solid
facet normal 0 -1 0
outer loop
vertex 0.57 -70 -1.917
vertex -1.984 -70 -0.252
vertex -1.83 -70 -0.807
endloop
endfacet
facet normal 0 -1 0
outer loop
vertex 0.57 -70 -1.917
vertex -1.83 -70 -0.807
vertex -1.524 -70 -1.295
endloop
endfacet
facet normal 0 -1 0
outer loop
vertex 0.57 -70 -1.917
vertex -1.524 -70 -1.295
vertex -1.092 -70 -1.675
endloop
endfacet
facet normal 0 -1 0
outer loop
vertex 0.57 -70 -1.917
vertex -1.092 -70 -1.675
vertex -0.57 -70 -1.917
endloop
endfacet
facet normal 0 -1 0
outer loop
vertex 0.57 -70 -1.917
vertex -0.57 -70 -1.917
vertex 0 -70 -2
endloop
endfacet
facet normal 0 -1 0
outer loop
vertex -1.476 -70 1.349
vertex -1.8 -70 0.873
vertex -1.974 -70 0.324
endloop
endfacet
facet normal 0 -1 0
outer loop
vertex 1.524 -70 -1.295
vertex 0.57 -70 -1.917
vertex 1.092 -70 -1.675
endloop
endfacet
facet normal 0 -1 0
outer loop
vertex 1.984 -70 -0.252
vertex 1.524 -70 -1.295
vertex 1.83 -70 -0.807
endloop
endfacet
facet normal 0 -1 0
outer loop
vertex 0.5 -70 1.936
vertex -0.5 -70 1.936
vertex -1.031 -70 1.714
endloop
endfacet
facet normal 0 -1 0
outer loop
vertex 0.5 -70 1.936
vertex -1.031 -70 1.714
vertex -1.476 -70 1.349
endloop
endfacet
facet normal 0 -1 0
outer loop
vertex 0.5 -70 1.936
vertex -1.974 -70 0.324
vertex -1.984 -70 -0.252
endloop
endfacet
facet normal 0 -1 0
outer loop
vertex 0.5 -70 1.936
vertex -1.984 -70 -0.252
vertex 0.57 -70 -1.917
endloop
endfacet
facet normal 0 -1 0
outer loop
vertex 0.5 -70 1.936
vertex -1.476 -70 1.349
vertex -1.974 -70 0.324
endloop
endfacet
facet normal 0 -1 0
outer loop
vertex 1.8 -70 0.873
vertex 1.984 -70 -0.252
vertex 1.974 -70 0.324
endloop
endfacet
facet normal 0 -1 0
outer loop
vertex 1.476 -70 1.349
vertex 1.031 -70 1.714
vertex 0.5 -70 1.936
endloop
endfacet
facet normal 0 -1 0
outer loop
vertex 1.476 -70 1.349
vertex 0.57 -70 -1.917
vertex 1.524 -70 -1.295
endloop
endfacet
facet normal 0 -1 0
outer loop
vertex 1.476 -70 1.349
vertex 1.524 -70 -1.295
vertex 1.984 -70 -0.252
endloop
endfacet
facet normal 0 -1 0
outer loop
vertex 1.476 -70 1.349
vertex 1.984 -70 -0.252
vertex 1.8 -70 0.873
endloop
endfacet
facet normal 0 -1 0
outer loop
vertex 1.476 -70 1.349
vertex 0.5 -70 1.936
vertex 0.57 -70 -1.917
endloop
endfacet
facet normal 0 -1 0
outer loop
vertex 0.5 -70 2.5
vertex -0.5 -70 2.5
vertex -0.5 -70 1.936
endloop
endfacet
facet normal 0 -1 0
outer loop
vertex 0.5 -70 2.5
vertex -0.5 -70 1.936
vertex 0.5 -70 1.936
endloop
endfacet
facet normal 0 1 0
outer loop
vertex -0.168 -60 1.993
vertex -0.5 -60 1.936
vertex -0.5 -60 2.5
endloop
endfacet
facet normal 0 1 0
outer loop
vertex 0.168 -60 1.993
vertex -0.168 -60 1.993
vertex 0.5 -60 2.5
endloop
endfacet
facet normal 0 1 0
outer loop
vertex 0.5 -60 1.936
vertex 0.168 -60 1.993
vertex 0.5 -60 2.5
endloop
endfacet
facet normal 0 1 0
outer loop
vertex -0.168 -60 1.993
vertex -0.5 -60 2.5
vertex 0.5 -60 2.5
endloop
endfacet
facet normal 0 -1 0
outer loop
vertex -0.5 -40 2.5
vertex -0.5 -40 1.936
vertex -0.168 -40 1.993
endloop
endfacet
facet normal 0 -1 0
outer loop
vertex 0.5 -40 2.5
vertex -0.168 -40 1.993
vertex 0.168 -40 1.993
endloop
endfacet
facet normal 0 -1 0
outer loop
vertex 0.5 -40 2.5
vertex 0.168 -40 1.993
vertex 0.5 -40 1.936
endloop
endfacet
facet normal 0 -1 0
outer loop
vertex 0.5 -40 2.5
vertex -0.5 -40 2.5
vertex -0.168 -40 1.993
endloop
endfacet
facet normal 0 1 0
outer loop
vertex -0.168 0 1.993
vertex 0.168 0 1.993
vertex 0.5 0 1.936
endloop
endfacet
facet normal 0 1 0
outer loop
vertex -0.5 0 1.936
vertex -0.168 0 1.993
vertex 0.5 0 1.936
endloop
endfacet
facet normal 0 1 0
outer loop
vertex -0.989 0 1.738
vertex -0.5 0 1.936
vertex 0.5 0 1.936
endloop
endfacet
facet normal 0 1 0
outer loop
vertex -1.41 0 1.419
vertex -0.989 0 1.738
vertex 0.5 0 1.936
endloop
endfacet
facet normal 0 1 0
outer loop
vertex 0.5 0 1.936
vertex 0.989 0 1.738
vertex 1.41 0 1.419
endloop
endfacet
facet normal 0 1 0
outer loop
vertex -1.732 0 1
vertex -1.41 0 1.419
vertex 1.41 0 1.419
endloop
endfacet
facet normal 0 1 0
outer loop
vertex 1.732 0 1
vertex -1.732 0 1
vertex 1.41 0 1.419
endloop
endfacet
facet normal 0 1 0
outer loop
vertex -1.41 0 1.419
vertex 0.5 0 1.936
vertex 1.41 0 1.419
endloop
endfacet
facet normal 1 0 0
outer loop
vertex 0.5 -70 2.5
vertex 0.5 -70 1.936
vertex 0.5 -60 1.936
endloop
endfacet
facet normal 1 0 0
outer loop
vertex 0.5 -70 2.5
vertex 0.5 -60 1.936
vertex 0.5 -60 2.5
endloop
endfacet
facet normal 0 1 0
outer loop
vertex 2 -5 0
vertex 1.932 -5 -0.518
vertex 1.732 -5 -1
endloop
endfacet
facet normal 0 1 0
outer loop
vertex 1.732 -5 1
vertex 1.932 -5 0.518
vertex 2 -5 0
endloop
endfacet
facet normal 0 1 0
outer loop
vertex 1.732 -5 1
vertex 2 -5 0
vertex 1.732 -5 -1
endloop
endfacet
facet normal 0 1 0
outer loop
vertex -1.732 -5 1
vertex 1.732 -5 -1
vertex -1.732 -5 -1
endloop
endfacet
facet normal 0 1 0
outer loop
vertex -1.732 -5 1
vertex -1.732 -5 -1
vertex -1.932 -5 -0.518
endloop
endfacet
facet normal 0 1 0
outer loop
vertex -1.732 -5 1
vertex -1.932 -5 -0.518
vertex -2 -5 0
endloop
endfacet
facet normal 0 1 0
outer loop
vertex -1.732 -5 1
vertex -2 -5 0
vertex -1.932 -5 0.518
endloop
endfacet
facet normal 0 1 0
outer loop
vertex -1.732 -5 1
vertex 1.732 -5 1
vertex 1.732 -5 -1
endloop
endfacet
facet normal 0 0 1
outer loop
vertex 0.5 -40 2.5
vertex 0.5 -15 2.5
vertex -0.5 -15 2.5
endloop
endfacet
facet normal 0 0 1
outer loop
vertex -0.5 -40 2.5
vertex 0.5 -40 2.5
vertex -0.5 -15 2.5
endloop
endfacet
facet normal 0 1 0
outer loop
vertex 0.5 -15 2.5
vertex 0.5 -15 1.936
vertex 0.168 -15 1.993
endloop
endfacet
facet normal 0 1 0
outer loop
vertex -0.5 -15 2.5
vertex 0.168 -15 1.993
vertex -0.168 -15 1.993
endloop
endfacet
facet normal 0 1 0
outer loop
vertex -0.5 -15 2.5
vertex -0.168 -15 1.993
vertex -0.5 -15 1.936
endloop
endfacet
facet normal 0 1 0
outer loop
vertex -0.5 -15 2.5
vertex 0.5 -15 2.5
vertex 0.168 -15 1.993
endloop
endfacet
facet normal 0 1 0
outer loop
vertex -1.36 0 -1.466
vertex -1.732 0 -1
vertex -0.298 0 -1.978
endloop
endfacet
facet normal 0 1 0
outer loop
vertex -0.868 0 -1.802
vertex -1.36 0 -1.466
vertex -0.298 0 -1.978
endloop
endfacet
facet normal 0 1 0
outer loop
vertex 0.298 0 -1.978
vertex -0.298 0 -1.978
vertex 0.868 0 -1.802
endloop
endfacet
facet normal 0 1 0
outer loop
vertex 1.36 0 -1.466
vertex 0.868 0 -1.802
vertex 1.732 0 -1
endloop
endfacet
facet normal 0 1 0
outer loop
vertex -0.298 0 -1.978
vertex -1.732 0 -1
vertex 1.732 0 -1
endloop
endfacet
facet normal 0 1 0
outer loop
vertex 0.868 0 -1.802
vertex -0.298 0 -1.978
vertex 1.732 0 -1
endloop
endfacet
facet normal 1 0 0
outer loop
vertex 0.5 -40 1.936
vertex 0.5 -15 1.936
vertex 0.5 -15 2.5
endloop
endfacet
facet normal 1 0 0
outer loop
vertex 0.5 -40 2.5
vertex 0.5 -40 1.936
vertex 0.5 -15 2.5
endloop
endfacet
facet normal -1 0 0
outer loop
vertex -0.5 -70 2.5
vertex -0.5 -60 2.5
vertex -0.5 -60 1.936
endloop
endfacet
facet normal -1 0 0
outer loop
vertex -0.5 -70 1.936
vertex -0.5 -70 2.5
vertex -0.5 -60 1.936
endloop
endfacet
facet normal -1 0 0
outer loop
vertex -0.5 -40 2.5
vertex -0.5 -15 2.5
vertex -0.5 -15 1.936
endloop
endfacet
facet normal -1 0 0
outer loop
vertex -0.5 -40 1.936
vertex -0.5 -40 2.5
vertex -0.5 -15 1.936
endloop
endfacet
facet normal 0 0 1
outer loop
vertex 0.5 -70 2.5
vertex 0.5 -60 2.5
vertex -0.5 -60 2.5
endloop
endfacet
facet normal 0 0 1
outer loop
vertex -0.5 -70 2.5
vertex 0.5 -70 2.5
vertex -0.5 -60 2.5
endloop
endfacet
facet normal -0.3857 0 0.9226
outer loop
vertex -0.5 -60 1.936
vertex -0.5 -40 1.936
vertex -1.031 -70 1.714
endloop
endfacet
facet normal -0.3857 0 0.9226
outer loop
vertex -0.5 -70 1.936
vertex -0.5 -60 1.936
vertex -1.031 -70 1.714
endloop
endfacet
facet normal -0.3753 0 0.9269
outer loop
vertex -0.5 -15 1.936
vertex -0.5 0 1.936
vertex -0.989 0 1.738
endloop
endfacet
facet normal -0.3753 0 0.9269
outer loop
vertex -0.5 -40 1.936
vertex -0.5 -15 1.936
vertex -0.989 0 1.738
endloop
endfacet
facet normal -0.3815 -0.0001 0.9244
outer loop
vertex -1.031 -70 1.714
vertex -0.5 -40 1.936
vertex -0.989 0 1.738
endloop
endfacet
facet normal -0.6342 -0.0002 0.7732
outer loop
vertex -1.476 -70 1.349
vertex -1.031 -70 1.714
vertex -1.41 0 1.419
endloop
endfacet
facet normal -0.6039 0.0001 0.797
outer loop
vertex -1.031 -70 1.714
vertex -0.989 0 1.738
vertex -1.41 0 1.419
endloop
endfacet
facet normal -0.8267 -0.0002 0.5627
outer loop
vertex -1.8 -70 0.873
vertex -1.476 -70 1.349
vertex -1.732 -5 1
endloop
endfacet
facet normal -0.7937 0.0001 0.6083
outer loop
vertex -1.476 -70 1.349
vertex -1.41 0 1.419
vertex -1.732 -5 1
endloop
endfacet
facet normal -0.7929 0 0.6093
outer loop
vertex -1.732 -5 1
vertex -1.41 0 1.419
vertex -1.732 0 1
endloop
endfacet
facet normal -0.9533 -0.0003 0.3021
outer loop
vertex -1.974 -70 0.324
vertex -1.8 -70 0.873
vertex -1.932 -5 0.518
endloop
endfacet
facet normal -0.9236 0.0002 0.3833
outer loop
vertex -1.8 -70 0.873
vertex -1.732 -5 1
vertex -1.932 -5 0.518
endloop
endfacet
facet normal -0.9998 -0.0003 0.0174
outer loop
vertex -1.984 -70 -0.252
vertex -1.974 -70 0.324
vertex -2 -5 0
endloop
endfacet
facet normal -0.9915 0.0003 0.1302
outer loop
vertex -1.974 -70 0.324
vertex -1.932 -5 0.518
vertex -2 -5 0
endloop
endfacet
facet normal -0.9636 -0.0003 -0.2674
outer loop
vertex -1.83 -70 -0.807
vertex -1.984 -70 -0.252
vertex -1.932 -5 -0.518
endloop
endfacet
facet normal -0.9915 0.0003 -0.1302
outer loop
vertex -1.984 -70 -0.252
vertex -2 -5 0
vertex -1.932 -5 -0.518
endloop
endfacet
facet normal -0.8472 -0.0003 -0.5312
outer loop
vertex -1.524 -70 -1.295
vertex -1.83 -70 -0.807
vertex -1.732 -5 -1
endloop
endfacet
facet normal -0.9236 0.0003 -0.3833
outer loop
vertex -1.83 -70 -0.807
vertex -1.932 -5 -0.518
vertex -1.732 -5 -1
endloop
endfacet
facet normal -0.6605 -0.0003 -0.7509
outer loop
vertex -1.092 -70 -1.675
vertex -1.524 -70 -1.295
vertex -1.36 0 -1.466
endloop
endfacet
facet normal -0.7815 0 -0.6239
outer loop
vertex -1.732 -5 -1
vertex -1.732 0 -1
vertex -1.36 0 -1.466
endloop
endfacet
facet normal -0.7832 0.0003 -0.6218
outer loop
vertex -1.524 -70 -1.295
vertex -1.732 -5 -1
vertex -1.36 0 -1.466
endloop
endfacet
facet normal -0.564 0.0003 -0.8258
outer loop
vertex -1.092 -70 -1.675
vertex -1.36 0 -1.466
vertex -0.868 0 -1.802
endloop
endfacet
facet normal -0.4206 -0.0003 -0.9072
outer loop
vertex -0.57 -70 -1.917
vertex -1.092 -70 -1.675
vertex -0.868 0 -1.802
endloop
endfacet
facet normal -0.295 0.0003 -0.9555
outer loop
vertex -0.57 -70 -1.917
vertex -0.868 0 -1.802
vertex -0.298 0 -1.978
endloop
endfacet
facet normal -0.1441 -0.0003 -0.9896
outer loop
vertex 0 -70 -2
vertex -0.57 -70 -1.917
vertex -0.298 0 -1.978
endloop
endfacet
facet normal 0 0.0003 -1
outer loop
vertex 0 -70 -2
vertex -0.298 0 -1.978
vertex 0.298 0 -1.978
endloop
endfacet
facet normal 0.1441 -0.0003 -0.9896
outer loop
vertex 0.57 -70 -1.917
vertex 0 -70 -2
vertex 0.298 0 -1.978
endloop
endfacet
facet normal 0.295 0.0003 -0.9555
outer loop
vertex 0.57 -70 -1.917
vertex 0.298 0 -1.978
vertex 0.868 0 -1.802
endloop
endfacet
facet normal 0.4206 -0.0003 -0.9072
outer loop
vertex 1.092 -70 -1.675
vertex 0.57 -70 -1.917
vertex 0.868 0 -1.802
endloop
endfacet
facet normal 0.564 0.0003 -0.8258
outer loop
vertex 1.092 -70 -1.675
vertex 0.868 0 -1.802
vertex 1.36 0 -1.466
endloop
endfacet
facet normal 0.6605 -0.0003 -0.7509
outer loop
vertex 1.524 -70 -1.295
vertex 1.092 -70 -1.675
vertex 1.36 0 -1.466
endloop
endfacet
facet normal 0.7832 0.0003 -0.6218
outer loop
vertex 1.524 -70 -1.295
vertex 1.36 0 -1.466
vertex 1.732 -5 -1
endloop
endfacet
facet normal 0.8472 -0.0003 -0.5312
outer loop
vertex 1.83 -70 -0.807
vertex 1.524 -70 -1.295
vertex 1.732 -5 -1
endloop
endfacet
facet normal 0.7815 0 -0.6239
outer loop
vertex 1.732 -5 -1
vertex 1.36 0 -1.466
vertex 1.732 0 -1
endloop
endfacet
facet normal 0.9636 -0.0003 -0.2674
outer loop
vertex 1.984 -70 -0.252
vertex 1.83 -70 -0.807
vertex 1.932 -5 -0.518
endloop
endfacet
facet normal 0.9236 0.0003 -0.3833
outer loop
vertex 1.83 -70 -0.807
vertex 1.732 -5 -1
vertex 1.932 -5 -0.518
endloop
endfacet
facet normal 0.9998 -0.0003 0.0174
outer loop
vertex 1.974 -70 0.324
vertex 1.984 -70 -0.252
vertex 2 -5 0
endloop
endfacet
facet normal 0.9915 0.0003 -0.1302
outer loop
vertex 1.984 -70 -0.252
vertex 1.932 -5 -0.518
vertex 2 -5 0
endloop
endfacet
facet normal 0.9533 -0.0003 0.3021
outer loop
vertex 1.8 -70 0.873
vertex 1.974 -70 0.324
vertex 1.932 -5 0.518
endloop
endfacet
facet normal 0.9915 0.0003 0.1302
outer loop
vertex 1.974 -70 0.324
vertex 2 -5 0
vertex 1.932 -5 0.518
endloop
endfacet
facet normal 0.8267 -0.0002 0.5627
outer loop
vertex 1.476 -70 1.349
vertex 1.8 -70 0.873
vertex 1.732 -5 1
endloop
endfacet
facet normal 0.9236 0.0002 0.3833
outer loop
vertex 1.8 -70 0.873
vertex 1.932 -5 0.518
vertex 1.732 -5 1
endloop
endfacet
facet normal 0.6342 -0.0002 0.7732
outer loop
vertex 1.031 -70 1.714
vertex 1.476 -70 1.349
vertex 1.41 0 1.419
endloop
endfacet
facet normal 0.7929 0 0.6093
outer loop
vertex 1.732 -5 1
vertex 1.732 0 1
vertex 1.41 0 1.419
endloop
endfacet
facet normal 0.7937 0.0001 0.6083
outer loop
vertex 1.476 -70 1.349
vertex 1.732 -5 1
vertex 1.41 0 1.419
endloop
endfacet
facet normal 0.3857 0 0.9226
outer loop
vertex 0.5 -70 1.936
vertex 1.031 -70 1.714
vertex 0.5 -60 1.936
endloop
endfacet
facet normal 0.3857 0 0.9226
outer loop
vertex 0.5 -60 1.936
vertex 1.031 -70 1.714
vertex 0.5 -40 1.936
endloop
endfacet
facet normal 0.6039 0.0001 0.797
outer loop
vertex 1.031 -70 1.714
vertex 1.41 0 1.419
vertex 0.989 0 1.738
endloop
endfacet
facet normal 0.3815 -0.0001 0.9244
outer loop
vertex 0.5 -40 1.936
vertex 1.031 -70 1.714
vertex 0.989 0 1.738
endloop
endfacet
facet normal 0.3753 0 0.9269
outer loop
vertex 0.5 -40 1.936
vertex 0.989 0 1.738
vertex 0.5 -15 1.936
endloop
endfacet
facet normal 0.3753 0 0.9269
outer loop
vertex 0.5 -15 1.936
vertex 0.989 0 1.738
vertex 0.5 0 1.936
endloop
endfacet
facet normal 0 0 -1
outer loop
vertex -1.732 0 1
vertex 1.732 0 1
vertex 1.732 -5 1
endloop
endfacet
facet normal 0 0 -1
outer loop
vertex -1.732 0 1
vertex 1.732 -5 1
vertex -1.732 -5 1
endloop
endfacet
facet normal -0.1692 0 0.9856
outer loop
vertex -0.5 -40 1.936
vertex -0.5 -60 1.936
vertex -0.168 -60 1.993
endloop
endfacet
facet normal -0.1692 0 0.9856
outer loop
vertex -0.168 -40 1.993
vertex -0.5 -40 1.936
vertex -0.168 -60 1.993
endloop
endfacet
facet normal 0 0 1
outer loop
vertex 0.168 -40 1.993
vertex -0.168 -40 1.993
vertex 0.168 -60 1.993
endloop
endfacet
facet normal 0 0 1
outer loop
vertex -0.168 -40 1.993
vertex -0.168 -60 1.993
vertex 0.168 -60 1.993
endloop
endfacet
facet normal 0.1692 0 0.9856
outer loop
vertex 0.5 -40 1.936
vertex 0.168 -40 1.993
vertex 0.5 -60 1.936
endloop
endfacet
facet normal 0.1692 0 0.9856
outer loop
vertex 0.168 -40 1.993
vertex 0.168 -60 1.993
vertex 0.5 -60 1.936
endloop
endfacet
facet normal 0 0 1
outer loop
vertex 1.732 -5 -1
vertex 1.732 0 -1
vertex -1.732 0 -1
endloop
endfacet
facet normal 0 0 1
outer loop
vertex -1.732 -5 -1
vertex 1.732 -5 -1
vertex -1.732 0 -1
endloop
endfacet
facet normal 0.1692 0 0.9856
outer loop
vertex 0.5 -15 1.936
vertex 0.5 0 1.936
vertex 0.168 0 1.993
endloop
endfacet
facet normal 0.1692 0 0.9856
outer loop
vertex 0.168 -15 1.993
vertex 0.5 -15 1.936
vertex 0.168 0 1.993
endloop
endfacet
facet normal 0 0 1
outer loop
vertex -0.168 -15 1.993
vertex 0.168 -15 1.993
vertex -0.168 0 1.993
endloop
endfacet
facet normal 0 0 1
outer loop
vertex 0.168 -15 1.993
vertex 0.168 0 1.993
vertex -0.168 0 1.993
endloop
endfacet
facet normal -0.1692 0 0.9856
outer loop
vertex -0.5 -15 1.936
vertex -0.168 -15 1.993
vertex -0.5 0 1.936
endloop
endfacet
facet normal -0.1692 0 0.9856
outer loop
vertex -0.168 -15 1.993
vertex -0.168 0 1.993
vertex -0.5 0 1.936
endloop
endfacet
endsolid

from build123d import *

# Parameters (mm, degrees)
F1_DEPTH = 70
F4_DEPTH = 20
F6_DEPTH = 15
F7_W     = 6
F7_H     = 2
F8_DEPTH = 5


with BuildPart() as f1:
    # F0 (on Front) → F1 (new body)
    with BuildSketch(Plane.XZ):
        with BuildLine():
            Line((-0.5, 2.5), (-0.5, 1.9364916731))
            ThreePointArc((-0.5, 1.9364916731), (0, -2), (0.5, 1.9364916731))
            Line((0.5, 1.9364916731), (0.5, 2.5))
            Line((0.5, 2.5), (-0.5, 2.5))
        make_face()
    extrude(amount=F1_DEPTH)

    # F3 (on offset) → F4 (cut)
    with BuildSketch(Plane.XZ.offset(60)):
        with BuildLine():
            ThreePointArc((-0.5, 1.9364916731), (0.0006379585, 1.9999998983), (0.5012352994, 1.9361722998))
            Line((0.5012352994, 1.9361722998), (0.5, 2.5))
            Line((0.5, 2.5), (-0.5, 2.5))
            Line((-0.5, 2.5), (-0.5, 1.9364916731))
        make_face()
    extrude(amount=-F4_DEPTH, mode=Mode.SUBTRACT)

    # F5 (on face) → F6 (cut)
    with BuildSketch(Plane(origin=(0, 0, 0), x_dir=(-1, 0, 0), z_dir=(0, 1, 0))):
        with BuildLine():
            Line((-0.5, 2.5), (-0.5, 1.9364916731))
            ThreePointArc((-0.5, 1.9364916731), (0, 2), (0.5, 1.9364916731))
            Line((0.5, 1.9364916731), (0.5, 2.5))
            Line((0.5, 2.5), (-0.5, 2.5))
        make_face()
    extrude(amount=-F6_DEPTH, mode=Mode.SUBTRACT)

    # F7 (on face) → F8 (cut)
    with BuildSketch(Plane(origin=(0, 0, 0), x_dir=(-1, 0, 0), z_dir=(0, 1, 0))):
        Rectangle(F7_W, F7_H)
    extrude(amount=-F8_DEPTH, mode=Mode.SUBTRACT)


solid = f1.part
